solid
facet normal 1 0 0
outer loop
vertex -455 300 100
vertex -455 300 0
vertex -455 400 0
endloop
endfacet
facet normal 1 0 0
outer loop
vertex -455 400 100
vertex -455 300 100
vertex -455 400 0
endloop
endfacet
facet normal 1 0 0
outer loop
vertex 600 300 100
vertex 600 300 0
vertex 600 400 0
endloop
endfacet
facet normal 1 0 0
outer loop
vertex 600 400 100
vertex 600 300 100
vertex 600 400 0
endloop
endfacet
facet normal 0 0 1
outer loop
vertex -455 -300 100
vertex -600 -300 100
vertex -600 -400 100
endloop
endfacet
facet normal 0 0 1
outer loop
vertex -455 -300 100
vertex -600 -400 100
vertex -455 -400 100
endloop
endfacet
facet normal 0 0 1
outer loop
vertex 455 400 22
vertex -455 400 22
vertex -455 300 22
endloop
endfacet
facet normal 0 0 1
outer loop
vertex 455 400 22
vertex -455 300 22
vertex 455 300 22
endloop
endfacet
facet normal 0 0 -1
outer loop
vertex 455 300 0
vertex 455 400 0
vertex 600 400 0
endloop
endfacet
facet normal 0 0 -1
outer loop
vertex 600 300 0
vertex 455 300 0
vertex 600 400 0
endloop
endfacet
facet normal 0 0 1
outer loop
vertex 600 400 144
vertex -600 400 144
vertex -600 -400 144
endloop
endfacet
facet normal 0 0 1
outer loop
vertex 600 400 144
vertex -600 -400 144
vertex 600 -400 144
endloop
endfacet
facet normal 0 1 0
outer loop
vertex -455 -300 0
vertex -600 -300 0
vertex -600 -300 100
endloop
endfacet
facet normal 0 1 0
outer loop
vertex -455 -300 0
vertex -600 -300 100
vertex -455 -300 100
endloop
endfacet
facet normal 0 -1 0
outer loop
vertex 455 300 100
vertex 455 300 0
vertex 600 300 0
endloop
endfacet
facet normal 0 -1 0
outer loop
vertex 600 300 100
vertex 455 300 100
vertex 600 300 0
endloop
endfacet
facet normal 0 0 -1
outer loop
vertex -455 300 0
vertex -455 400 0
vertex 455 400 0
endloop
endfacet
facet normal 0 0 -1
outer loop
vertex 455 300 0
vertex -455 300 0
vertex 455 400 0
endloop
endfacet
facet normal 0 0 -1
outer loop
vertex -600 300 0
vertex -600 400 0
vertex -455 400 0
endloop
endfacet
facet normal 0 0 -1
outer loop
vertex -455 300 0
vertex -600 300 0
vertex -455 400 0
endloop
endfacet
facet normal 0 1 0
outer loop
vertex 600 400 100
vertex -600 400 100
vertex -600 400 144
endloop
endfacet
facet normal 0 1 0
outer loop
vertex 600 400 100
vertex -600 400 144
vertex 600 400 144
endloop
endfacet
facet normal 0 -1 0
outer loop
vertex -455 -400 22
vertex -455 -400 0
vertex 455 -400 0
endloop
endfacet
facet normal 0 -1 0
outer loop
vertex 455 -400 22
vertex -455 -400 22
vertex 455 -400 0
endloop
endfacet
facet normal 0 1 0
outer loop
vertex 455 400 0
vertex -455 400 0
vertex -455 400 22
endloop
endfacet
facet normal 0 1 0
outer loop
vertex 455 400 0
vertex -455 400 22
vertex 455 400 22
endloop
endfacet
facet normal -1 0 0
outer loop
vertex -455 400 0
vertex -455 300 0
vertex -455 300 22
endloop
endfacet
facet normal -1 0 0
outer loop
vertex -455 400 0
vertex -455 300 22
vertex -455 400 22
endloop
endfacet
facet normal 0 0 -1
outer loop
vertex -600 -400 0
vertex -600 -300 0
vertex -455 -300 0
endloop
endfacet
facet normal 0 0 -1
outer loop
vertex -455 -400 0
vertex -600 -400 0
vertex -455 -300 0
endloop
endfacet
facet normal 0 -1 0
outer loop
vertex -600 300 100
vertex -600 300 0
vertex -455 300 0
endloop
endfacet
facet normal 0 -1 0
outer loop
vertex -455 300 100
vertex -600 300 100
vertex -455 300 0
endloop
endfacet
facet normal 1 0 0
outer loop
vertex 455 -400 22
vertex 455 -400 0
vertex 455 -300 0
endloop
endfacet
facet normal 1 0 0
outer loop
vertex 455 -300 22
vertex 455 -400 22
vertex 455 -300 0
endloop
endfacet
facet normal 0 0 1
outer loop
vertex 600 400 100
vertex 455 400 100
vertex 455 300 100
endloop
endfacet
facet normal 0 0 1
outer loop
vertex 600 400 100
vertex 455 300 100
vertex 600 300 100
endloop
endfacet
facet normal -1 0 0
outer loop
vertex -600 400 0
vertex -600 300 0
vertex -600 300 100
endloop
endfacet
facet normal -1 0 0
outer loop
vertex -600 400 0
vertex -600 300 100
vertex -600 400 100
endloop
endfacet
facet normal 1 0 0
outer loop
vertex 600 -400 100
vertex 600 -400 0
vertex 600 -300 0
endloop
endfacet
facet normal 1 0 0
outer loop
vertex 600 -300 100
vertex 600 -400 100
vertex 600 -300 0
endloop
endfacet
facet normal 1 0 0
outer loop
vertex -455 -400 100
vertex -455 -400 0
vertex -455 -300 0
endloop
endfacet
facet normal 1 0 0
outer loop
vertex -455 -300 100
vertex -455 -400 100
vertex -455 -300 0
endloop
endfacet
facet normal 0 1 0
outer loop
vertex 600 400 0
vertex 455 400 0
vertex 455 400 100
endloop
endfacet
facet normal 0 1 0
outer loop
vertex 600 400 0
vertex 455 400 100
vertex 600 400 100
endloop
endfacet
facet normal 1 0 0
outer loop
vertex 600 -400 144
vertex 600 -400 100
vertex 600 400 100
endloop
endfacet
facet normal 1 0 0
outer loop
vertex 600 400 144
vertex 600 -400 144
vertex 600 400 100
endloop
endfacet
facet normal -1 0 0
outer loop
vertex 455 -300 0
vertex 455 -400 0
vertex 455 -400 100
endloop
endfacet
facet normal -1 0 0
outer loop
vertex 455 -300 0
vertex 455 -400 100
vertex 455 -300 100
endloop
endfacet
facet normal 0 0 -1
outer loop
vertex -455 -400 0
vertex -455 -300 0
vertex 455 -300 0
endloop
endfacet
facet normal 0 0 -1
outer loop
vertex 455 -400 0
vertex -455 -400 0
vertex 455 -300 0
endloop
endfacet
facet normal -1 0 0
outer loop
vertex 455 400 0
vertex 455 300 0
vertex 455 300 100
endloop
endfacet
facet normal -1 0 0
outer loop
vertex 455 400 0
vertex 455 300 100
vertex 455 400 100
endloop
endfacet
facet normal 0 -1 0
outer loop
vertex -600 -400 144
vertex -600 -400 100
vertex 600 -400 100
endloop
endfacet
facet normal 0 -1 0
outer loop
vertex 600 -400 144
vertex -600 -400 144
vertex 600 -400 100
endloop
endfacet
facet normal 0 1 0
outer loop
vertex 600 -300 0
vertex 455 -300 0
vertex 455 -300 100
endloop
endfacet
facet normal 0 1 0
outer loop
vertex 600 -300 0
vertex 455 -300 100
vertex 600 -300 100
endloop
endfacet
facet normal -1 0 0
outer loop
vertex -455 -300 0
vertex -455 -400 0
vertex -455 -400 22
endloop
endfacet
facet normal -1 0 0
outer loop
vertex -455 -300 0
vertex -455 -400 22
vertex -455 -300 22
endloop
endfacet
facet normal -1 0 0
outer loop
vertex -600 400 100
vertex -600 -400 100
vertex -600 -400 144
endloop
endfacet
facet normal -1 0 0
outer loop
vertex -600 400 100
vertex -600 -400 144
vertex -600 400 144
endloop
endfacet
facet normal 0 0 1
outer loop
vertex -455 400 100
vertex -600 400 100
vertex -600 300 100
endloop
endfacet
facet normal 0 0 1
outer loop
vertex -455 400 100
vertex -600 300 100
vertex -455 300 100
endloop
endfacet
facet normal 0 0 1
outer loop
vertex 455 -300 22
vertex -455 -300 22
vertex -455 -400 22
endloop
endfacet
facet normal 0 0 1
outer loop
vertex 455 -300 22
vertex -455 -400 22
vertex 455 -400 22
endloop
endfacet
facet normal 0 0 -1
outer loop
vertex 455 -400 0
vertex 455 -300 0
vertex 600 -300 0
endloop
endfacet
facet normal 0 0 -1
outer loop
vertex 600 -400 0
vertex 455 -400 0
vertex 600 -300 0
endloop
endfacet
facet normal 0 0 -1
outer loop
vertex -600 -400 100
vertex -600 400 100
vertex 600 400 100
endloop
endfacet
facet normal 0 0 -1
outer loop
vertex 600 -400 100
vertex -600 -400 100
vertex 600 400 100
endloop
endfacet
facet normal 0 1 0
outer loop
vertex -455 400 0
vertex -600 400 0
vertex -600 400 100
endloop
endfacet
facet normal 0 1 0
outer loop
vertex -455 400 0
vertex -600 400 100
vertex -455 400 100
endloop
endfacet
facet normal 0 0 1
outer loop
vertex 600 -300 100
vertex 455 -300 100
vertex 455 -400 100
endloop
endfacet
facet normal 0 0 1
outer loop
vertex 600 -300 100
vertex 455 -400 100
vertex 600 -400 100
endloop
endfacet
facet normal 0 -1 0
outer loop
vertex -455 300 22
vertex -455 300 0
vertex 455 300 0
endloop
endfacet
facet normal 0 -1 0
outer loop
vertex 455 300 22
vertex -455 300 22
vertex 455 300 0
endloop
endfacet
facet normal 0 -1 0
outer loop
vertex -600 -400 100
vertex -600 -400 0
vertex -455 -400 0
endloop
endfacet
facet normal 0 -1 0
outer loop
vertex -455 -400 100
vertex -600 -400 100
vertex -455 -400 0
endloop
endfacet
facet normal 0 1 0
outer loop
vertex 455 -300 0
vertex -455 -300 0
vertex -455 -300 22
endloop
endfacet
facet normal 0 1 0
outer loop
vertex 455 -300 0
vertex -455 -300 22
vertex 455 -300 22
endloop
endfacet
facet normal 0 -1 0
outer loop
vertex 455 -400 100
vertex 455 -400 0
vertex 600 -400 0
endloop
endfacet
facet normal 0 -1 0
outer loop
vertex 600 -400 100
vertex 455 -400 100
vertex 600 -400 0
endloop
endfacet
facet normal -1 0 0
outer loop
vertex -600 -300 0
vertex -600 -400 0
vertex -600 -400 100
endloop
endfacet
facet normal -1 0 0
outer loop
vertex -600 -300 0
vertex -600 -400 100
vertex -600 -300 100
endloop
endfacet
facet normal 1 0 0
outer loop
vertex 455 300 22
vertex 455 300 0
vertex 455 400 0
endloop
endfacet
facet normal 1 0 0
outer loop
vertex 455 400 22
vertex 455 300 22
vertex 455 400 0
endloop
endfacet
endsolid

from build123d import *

# Parameters (mm, degrees)
F0_W     = 910
F0_H     = 100
F1_DEPTH = 22
F0_W_2   = 145
F2_DEPTH = 100
F3_W     = 1200
F3_H     = 800
F4_DEPTH = 44


with BuildPart() as f1:
    # F0 (on Top) → F1 (new body)
    with BuildSketch(Plane.XY):
        with Locations((0, 350)):
            Rectangle(F0_W, F0_H)
    extrude(amount=F1_DEPTH)


with BuildPart() as f1b:
    # F0 (on Top) → F1, piece 2 (new body)
    with BuildSketch(Plane.XY):
        with Locations((0, -350)):
            Rectangle(F0_W, F0_H)
    extrude(amount=F1_DEPTH)


with BuildPart() as f2:
    # F0 (on Top) → F2 (new body)
    with BuildSketch(Plane.XY):
        with Locations((527.5, -350)):
            Rectangle(F0_W_2, F0_H)
    extrude(amount=F2_DEPTH)


with BuildPart() as f2b:
    # F0 (on Top) → F2, piece 2 (new body)
    with BuildSketch(Plane.XY):
        with Locations((-527.5, -350)):
            Rectangle(F0_W_2, F0_H)
    extrude(amount=F2_DEPTH)


with BuildPart() as f2c:
    # F0 (on Top) → F2, piece 3 (new body)
    with BuildSketch(Plane.XY):
        with Locations((-527.5, 350)):
            Rectangle(F0_W_2, F0_H)
    extrude(amount=F2_DEPTH)


with BuildPart() as f2d:
    # F0 (on Top) → F2, piece 4 (new body)
    with BuildSketch(Plane.XY):
        with Locations((527.5, 350)):
            Rectangle(F0_W_2, F0_H)
    extrude(amount=F2_DEPTH)


with BuildPart() as f4:
    # F3 (on face) → F4 (new body)
    with BuildSketch(Plane.XY.offset(100)):
        Rectangle(F3_W, F3_H)
    extrude(amount=F4_DEPTH)


solid = Compound([f1.part, f1b.part, f2.part, f2b.part, f2c.part, f2d.part, f4.part])
